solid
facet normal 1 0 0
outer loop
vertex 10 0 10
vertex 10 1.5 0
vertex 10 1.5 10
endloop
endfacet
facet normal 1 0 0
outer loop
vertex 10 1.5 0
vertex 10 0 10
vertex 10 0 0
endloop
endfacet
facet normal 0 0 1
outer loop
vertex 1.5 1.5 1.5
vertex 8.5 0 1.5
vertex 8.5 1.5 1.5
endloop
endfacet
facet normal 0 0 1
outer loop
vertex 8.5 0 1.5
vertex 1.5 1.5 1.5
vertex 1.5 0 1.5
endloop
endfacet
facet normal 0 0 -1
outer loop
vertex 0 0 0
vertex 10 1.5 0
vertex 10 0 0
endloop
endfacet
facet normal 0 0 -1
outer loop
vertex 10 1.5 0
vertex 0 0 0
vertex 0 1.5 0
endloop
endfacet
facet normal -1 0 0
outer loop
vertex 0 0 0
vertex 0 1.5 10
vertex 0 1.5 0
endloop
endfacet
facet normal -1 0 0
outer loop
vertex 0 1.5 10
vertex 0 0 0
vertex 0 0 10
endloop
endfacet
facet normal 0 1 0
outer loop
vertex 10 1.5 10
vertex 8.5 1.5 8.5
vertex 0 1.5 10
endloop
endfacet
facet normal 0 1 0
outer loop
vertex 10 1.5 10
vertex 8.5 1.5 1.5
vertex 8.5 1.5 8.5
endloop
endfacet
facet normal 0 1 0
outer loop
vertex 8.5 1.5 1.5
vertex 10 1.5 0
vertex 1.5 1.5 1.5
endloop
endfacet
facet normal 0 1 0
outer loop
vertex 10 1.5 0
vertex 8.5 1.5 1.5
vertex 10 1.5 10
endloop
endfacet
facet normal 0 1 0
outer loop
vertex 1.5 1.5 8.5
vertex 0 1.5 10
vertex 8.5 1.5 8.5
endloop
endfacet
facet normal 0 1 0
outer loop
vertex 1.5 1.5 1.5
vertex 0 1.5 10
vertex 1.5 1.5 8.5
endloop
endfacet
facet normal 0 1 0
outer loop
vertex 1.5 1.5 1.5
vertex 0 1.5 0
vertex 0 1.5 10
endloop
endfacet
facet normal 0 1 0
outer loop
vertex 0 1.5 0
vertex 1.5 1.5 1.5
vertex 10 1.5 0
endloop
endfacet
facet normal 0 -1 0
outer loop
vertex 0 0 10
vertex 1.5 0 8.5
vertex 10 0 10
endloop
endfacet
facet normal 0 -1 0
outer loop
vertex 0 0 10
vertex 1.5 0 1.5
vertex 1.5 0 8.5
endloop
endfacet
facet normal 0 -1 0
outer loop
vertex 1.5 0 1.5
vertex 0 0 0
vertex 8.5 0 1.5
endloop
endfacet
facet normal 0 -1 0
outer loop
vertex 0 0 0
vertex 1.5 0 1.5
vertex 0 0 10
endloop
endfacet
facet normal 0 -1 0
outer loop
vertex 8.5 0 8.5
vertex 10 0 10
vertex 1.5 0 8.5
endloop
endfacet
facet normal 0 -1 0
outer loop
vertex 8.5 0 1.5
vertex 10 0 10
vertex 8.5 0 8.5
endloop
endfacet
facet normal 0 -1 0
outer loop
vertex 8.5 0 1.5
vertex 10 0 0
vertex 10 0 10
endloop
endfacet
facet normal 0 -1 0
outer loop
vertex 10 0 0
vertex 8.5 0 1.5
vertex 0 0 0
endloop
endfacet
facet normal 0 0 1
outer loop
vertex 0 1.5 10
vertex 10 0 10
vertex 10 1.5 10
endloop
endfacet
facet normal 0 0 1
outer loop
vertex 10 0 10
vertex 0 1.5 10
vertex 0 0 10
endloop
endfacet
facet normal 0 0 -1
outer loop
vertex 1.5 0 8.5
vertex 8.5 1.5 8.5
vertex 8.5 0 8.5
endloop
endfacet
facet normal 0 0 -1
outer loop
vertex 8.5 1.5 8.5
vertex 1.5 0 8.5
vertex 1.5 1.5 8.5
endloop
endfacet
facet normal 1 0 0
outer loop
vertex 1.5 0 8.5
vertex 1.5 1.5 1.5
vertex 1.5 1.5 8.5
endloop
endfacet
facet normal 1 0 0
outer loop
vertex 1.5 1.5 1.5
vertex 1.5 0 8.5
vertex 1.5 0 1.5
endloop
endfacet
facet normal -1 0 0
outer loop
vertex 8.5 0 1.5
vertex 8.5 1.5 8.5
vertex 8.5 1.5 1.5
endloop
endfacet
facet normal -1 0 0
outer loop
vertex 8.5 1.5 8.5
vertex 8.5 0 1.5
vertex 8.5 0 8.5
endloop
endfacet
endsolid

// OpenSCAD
// U-shaped spring clip.
$fn = 60;
eps = 0.02;
clip_w = 10;
clip_h = 10;
clip_t = 1.5;
union() { cube([clip_w,clip_t,clip_t]); translate([0,0,clip_h-clip_t]) cube([clip_w,clip_t,clip_t]); cube([clip_t,clip_t,clip_h]); translate([clip_w-clip_t,0,0]) cube([clip_t,clip_t,clip_h]); }
